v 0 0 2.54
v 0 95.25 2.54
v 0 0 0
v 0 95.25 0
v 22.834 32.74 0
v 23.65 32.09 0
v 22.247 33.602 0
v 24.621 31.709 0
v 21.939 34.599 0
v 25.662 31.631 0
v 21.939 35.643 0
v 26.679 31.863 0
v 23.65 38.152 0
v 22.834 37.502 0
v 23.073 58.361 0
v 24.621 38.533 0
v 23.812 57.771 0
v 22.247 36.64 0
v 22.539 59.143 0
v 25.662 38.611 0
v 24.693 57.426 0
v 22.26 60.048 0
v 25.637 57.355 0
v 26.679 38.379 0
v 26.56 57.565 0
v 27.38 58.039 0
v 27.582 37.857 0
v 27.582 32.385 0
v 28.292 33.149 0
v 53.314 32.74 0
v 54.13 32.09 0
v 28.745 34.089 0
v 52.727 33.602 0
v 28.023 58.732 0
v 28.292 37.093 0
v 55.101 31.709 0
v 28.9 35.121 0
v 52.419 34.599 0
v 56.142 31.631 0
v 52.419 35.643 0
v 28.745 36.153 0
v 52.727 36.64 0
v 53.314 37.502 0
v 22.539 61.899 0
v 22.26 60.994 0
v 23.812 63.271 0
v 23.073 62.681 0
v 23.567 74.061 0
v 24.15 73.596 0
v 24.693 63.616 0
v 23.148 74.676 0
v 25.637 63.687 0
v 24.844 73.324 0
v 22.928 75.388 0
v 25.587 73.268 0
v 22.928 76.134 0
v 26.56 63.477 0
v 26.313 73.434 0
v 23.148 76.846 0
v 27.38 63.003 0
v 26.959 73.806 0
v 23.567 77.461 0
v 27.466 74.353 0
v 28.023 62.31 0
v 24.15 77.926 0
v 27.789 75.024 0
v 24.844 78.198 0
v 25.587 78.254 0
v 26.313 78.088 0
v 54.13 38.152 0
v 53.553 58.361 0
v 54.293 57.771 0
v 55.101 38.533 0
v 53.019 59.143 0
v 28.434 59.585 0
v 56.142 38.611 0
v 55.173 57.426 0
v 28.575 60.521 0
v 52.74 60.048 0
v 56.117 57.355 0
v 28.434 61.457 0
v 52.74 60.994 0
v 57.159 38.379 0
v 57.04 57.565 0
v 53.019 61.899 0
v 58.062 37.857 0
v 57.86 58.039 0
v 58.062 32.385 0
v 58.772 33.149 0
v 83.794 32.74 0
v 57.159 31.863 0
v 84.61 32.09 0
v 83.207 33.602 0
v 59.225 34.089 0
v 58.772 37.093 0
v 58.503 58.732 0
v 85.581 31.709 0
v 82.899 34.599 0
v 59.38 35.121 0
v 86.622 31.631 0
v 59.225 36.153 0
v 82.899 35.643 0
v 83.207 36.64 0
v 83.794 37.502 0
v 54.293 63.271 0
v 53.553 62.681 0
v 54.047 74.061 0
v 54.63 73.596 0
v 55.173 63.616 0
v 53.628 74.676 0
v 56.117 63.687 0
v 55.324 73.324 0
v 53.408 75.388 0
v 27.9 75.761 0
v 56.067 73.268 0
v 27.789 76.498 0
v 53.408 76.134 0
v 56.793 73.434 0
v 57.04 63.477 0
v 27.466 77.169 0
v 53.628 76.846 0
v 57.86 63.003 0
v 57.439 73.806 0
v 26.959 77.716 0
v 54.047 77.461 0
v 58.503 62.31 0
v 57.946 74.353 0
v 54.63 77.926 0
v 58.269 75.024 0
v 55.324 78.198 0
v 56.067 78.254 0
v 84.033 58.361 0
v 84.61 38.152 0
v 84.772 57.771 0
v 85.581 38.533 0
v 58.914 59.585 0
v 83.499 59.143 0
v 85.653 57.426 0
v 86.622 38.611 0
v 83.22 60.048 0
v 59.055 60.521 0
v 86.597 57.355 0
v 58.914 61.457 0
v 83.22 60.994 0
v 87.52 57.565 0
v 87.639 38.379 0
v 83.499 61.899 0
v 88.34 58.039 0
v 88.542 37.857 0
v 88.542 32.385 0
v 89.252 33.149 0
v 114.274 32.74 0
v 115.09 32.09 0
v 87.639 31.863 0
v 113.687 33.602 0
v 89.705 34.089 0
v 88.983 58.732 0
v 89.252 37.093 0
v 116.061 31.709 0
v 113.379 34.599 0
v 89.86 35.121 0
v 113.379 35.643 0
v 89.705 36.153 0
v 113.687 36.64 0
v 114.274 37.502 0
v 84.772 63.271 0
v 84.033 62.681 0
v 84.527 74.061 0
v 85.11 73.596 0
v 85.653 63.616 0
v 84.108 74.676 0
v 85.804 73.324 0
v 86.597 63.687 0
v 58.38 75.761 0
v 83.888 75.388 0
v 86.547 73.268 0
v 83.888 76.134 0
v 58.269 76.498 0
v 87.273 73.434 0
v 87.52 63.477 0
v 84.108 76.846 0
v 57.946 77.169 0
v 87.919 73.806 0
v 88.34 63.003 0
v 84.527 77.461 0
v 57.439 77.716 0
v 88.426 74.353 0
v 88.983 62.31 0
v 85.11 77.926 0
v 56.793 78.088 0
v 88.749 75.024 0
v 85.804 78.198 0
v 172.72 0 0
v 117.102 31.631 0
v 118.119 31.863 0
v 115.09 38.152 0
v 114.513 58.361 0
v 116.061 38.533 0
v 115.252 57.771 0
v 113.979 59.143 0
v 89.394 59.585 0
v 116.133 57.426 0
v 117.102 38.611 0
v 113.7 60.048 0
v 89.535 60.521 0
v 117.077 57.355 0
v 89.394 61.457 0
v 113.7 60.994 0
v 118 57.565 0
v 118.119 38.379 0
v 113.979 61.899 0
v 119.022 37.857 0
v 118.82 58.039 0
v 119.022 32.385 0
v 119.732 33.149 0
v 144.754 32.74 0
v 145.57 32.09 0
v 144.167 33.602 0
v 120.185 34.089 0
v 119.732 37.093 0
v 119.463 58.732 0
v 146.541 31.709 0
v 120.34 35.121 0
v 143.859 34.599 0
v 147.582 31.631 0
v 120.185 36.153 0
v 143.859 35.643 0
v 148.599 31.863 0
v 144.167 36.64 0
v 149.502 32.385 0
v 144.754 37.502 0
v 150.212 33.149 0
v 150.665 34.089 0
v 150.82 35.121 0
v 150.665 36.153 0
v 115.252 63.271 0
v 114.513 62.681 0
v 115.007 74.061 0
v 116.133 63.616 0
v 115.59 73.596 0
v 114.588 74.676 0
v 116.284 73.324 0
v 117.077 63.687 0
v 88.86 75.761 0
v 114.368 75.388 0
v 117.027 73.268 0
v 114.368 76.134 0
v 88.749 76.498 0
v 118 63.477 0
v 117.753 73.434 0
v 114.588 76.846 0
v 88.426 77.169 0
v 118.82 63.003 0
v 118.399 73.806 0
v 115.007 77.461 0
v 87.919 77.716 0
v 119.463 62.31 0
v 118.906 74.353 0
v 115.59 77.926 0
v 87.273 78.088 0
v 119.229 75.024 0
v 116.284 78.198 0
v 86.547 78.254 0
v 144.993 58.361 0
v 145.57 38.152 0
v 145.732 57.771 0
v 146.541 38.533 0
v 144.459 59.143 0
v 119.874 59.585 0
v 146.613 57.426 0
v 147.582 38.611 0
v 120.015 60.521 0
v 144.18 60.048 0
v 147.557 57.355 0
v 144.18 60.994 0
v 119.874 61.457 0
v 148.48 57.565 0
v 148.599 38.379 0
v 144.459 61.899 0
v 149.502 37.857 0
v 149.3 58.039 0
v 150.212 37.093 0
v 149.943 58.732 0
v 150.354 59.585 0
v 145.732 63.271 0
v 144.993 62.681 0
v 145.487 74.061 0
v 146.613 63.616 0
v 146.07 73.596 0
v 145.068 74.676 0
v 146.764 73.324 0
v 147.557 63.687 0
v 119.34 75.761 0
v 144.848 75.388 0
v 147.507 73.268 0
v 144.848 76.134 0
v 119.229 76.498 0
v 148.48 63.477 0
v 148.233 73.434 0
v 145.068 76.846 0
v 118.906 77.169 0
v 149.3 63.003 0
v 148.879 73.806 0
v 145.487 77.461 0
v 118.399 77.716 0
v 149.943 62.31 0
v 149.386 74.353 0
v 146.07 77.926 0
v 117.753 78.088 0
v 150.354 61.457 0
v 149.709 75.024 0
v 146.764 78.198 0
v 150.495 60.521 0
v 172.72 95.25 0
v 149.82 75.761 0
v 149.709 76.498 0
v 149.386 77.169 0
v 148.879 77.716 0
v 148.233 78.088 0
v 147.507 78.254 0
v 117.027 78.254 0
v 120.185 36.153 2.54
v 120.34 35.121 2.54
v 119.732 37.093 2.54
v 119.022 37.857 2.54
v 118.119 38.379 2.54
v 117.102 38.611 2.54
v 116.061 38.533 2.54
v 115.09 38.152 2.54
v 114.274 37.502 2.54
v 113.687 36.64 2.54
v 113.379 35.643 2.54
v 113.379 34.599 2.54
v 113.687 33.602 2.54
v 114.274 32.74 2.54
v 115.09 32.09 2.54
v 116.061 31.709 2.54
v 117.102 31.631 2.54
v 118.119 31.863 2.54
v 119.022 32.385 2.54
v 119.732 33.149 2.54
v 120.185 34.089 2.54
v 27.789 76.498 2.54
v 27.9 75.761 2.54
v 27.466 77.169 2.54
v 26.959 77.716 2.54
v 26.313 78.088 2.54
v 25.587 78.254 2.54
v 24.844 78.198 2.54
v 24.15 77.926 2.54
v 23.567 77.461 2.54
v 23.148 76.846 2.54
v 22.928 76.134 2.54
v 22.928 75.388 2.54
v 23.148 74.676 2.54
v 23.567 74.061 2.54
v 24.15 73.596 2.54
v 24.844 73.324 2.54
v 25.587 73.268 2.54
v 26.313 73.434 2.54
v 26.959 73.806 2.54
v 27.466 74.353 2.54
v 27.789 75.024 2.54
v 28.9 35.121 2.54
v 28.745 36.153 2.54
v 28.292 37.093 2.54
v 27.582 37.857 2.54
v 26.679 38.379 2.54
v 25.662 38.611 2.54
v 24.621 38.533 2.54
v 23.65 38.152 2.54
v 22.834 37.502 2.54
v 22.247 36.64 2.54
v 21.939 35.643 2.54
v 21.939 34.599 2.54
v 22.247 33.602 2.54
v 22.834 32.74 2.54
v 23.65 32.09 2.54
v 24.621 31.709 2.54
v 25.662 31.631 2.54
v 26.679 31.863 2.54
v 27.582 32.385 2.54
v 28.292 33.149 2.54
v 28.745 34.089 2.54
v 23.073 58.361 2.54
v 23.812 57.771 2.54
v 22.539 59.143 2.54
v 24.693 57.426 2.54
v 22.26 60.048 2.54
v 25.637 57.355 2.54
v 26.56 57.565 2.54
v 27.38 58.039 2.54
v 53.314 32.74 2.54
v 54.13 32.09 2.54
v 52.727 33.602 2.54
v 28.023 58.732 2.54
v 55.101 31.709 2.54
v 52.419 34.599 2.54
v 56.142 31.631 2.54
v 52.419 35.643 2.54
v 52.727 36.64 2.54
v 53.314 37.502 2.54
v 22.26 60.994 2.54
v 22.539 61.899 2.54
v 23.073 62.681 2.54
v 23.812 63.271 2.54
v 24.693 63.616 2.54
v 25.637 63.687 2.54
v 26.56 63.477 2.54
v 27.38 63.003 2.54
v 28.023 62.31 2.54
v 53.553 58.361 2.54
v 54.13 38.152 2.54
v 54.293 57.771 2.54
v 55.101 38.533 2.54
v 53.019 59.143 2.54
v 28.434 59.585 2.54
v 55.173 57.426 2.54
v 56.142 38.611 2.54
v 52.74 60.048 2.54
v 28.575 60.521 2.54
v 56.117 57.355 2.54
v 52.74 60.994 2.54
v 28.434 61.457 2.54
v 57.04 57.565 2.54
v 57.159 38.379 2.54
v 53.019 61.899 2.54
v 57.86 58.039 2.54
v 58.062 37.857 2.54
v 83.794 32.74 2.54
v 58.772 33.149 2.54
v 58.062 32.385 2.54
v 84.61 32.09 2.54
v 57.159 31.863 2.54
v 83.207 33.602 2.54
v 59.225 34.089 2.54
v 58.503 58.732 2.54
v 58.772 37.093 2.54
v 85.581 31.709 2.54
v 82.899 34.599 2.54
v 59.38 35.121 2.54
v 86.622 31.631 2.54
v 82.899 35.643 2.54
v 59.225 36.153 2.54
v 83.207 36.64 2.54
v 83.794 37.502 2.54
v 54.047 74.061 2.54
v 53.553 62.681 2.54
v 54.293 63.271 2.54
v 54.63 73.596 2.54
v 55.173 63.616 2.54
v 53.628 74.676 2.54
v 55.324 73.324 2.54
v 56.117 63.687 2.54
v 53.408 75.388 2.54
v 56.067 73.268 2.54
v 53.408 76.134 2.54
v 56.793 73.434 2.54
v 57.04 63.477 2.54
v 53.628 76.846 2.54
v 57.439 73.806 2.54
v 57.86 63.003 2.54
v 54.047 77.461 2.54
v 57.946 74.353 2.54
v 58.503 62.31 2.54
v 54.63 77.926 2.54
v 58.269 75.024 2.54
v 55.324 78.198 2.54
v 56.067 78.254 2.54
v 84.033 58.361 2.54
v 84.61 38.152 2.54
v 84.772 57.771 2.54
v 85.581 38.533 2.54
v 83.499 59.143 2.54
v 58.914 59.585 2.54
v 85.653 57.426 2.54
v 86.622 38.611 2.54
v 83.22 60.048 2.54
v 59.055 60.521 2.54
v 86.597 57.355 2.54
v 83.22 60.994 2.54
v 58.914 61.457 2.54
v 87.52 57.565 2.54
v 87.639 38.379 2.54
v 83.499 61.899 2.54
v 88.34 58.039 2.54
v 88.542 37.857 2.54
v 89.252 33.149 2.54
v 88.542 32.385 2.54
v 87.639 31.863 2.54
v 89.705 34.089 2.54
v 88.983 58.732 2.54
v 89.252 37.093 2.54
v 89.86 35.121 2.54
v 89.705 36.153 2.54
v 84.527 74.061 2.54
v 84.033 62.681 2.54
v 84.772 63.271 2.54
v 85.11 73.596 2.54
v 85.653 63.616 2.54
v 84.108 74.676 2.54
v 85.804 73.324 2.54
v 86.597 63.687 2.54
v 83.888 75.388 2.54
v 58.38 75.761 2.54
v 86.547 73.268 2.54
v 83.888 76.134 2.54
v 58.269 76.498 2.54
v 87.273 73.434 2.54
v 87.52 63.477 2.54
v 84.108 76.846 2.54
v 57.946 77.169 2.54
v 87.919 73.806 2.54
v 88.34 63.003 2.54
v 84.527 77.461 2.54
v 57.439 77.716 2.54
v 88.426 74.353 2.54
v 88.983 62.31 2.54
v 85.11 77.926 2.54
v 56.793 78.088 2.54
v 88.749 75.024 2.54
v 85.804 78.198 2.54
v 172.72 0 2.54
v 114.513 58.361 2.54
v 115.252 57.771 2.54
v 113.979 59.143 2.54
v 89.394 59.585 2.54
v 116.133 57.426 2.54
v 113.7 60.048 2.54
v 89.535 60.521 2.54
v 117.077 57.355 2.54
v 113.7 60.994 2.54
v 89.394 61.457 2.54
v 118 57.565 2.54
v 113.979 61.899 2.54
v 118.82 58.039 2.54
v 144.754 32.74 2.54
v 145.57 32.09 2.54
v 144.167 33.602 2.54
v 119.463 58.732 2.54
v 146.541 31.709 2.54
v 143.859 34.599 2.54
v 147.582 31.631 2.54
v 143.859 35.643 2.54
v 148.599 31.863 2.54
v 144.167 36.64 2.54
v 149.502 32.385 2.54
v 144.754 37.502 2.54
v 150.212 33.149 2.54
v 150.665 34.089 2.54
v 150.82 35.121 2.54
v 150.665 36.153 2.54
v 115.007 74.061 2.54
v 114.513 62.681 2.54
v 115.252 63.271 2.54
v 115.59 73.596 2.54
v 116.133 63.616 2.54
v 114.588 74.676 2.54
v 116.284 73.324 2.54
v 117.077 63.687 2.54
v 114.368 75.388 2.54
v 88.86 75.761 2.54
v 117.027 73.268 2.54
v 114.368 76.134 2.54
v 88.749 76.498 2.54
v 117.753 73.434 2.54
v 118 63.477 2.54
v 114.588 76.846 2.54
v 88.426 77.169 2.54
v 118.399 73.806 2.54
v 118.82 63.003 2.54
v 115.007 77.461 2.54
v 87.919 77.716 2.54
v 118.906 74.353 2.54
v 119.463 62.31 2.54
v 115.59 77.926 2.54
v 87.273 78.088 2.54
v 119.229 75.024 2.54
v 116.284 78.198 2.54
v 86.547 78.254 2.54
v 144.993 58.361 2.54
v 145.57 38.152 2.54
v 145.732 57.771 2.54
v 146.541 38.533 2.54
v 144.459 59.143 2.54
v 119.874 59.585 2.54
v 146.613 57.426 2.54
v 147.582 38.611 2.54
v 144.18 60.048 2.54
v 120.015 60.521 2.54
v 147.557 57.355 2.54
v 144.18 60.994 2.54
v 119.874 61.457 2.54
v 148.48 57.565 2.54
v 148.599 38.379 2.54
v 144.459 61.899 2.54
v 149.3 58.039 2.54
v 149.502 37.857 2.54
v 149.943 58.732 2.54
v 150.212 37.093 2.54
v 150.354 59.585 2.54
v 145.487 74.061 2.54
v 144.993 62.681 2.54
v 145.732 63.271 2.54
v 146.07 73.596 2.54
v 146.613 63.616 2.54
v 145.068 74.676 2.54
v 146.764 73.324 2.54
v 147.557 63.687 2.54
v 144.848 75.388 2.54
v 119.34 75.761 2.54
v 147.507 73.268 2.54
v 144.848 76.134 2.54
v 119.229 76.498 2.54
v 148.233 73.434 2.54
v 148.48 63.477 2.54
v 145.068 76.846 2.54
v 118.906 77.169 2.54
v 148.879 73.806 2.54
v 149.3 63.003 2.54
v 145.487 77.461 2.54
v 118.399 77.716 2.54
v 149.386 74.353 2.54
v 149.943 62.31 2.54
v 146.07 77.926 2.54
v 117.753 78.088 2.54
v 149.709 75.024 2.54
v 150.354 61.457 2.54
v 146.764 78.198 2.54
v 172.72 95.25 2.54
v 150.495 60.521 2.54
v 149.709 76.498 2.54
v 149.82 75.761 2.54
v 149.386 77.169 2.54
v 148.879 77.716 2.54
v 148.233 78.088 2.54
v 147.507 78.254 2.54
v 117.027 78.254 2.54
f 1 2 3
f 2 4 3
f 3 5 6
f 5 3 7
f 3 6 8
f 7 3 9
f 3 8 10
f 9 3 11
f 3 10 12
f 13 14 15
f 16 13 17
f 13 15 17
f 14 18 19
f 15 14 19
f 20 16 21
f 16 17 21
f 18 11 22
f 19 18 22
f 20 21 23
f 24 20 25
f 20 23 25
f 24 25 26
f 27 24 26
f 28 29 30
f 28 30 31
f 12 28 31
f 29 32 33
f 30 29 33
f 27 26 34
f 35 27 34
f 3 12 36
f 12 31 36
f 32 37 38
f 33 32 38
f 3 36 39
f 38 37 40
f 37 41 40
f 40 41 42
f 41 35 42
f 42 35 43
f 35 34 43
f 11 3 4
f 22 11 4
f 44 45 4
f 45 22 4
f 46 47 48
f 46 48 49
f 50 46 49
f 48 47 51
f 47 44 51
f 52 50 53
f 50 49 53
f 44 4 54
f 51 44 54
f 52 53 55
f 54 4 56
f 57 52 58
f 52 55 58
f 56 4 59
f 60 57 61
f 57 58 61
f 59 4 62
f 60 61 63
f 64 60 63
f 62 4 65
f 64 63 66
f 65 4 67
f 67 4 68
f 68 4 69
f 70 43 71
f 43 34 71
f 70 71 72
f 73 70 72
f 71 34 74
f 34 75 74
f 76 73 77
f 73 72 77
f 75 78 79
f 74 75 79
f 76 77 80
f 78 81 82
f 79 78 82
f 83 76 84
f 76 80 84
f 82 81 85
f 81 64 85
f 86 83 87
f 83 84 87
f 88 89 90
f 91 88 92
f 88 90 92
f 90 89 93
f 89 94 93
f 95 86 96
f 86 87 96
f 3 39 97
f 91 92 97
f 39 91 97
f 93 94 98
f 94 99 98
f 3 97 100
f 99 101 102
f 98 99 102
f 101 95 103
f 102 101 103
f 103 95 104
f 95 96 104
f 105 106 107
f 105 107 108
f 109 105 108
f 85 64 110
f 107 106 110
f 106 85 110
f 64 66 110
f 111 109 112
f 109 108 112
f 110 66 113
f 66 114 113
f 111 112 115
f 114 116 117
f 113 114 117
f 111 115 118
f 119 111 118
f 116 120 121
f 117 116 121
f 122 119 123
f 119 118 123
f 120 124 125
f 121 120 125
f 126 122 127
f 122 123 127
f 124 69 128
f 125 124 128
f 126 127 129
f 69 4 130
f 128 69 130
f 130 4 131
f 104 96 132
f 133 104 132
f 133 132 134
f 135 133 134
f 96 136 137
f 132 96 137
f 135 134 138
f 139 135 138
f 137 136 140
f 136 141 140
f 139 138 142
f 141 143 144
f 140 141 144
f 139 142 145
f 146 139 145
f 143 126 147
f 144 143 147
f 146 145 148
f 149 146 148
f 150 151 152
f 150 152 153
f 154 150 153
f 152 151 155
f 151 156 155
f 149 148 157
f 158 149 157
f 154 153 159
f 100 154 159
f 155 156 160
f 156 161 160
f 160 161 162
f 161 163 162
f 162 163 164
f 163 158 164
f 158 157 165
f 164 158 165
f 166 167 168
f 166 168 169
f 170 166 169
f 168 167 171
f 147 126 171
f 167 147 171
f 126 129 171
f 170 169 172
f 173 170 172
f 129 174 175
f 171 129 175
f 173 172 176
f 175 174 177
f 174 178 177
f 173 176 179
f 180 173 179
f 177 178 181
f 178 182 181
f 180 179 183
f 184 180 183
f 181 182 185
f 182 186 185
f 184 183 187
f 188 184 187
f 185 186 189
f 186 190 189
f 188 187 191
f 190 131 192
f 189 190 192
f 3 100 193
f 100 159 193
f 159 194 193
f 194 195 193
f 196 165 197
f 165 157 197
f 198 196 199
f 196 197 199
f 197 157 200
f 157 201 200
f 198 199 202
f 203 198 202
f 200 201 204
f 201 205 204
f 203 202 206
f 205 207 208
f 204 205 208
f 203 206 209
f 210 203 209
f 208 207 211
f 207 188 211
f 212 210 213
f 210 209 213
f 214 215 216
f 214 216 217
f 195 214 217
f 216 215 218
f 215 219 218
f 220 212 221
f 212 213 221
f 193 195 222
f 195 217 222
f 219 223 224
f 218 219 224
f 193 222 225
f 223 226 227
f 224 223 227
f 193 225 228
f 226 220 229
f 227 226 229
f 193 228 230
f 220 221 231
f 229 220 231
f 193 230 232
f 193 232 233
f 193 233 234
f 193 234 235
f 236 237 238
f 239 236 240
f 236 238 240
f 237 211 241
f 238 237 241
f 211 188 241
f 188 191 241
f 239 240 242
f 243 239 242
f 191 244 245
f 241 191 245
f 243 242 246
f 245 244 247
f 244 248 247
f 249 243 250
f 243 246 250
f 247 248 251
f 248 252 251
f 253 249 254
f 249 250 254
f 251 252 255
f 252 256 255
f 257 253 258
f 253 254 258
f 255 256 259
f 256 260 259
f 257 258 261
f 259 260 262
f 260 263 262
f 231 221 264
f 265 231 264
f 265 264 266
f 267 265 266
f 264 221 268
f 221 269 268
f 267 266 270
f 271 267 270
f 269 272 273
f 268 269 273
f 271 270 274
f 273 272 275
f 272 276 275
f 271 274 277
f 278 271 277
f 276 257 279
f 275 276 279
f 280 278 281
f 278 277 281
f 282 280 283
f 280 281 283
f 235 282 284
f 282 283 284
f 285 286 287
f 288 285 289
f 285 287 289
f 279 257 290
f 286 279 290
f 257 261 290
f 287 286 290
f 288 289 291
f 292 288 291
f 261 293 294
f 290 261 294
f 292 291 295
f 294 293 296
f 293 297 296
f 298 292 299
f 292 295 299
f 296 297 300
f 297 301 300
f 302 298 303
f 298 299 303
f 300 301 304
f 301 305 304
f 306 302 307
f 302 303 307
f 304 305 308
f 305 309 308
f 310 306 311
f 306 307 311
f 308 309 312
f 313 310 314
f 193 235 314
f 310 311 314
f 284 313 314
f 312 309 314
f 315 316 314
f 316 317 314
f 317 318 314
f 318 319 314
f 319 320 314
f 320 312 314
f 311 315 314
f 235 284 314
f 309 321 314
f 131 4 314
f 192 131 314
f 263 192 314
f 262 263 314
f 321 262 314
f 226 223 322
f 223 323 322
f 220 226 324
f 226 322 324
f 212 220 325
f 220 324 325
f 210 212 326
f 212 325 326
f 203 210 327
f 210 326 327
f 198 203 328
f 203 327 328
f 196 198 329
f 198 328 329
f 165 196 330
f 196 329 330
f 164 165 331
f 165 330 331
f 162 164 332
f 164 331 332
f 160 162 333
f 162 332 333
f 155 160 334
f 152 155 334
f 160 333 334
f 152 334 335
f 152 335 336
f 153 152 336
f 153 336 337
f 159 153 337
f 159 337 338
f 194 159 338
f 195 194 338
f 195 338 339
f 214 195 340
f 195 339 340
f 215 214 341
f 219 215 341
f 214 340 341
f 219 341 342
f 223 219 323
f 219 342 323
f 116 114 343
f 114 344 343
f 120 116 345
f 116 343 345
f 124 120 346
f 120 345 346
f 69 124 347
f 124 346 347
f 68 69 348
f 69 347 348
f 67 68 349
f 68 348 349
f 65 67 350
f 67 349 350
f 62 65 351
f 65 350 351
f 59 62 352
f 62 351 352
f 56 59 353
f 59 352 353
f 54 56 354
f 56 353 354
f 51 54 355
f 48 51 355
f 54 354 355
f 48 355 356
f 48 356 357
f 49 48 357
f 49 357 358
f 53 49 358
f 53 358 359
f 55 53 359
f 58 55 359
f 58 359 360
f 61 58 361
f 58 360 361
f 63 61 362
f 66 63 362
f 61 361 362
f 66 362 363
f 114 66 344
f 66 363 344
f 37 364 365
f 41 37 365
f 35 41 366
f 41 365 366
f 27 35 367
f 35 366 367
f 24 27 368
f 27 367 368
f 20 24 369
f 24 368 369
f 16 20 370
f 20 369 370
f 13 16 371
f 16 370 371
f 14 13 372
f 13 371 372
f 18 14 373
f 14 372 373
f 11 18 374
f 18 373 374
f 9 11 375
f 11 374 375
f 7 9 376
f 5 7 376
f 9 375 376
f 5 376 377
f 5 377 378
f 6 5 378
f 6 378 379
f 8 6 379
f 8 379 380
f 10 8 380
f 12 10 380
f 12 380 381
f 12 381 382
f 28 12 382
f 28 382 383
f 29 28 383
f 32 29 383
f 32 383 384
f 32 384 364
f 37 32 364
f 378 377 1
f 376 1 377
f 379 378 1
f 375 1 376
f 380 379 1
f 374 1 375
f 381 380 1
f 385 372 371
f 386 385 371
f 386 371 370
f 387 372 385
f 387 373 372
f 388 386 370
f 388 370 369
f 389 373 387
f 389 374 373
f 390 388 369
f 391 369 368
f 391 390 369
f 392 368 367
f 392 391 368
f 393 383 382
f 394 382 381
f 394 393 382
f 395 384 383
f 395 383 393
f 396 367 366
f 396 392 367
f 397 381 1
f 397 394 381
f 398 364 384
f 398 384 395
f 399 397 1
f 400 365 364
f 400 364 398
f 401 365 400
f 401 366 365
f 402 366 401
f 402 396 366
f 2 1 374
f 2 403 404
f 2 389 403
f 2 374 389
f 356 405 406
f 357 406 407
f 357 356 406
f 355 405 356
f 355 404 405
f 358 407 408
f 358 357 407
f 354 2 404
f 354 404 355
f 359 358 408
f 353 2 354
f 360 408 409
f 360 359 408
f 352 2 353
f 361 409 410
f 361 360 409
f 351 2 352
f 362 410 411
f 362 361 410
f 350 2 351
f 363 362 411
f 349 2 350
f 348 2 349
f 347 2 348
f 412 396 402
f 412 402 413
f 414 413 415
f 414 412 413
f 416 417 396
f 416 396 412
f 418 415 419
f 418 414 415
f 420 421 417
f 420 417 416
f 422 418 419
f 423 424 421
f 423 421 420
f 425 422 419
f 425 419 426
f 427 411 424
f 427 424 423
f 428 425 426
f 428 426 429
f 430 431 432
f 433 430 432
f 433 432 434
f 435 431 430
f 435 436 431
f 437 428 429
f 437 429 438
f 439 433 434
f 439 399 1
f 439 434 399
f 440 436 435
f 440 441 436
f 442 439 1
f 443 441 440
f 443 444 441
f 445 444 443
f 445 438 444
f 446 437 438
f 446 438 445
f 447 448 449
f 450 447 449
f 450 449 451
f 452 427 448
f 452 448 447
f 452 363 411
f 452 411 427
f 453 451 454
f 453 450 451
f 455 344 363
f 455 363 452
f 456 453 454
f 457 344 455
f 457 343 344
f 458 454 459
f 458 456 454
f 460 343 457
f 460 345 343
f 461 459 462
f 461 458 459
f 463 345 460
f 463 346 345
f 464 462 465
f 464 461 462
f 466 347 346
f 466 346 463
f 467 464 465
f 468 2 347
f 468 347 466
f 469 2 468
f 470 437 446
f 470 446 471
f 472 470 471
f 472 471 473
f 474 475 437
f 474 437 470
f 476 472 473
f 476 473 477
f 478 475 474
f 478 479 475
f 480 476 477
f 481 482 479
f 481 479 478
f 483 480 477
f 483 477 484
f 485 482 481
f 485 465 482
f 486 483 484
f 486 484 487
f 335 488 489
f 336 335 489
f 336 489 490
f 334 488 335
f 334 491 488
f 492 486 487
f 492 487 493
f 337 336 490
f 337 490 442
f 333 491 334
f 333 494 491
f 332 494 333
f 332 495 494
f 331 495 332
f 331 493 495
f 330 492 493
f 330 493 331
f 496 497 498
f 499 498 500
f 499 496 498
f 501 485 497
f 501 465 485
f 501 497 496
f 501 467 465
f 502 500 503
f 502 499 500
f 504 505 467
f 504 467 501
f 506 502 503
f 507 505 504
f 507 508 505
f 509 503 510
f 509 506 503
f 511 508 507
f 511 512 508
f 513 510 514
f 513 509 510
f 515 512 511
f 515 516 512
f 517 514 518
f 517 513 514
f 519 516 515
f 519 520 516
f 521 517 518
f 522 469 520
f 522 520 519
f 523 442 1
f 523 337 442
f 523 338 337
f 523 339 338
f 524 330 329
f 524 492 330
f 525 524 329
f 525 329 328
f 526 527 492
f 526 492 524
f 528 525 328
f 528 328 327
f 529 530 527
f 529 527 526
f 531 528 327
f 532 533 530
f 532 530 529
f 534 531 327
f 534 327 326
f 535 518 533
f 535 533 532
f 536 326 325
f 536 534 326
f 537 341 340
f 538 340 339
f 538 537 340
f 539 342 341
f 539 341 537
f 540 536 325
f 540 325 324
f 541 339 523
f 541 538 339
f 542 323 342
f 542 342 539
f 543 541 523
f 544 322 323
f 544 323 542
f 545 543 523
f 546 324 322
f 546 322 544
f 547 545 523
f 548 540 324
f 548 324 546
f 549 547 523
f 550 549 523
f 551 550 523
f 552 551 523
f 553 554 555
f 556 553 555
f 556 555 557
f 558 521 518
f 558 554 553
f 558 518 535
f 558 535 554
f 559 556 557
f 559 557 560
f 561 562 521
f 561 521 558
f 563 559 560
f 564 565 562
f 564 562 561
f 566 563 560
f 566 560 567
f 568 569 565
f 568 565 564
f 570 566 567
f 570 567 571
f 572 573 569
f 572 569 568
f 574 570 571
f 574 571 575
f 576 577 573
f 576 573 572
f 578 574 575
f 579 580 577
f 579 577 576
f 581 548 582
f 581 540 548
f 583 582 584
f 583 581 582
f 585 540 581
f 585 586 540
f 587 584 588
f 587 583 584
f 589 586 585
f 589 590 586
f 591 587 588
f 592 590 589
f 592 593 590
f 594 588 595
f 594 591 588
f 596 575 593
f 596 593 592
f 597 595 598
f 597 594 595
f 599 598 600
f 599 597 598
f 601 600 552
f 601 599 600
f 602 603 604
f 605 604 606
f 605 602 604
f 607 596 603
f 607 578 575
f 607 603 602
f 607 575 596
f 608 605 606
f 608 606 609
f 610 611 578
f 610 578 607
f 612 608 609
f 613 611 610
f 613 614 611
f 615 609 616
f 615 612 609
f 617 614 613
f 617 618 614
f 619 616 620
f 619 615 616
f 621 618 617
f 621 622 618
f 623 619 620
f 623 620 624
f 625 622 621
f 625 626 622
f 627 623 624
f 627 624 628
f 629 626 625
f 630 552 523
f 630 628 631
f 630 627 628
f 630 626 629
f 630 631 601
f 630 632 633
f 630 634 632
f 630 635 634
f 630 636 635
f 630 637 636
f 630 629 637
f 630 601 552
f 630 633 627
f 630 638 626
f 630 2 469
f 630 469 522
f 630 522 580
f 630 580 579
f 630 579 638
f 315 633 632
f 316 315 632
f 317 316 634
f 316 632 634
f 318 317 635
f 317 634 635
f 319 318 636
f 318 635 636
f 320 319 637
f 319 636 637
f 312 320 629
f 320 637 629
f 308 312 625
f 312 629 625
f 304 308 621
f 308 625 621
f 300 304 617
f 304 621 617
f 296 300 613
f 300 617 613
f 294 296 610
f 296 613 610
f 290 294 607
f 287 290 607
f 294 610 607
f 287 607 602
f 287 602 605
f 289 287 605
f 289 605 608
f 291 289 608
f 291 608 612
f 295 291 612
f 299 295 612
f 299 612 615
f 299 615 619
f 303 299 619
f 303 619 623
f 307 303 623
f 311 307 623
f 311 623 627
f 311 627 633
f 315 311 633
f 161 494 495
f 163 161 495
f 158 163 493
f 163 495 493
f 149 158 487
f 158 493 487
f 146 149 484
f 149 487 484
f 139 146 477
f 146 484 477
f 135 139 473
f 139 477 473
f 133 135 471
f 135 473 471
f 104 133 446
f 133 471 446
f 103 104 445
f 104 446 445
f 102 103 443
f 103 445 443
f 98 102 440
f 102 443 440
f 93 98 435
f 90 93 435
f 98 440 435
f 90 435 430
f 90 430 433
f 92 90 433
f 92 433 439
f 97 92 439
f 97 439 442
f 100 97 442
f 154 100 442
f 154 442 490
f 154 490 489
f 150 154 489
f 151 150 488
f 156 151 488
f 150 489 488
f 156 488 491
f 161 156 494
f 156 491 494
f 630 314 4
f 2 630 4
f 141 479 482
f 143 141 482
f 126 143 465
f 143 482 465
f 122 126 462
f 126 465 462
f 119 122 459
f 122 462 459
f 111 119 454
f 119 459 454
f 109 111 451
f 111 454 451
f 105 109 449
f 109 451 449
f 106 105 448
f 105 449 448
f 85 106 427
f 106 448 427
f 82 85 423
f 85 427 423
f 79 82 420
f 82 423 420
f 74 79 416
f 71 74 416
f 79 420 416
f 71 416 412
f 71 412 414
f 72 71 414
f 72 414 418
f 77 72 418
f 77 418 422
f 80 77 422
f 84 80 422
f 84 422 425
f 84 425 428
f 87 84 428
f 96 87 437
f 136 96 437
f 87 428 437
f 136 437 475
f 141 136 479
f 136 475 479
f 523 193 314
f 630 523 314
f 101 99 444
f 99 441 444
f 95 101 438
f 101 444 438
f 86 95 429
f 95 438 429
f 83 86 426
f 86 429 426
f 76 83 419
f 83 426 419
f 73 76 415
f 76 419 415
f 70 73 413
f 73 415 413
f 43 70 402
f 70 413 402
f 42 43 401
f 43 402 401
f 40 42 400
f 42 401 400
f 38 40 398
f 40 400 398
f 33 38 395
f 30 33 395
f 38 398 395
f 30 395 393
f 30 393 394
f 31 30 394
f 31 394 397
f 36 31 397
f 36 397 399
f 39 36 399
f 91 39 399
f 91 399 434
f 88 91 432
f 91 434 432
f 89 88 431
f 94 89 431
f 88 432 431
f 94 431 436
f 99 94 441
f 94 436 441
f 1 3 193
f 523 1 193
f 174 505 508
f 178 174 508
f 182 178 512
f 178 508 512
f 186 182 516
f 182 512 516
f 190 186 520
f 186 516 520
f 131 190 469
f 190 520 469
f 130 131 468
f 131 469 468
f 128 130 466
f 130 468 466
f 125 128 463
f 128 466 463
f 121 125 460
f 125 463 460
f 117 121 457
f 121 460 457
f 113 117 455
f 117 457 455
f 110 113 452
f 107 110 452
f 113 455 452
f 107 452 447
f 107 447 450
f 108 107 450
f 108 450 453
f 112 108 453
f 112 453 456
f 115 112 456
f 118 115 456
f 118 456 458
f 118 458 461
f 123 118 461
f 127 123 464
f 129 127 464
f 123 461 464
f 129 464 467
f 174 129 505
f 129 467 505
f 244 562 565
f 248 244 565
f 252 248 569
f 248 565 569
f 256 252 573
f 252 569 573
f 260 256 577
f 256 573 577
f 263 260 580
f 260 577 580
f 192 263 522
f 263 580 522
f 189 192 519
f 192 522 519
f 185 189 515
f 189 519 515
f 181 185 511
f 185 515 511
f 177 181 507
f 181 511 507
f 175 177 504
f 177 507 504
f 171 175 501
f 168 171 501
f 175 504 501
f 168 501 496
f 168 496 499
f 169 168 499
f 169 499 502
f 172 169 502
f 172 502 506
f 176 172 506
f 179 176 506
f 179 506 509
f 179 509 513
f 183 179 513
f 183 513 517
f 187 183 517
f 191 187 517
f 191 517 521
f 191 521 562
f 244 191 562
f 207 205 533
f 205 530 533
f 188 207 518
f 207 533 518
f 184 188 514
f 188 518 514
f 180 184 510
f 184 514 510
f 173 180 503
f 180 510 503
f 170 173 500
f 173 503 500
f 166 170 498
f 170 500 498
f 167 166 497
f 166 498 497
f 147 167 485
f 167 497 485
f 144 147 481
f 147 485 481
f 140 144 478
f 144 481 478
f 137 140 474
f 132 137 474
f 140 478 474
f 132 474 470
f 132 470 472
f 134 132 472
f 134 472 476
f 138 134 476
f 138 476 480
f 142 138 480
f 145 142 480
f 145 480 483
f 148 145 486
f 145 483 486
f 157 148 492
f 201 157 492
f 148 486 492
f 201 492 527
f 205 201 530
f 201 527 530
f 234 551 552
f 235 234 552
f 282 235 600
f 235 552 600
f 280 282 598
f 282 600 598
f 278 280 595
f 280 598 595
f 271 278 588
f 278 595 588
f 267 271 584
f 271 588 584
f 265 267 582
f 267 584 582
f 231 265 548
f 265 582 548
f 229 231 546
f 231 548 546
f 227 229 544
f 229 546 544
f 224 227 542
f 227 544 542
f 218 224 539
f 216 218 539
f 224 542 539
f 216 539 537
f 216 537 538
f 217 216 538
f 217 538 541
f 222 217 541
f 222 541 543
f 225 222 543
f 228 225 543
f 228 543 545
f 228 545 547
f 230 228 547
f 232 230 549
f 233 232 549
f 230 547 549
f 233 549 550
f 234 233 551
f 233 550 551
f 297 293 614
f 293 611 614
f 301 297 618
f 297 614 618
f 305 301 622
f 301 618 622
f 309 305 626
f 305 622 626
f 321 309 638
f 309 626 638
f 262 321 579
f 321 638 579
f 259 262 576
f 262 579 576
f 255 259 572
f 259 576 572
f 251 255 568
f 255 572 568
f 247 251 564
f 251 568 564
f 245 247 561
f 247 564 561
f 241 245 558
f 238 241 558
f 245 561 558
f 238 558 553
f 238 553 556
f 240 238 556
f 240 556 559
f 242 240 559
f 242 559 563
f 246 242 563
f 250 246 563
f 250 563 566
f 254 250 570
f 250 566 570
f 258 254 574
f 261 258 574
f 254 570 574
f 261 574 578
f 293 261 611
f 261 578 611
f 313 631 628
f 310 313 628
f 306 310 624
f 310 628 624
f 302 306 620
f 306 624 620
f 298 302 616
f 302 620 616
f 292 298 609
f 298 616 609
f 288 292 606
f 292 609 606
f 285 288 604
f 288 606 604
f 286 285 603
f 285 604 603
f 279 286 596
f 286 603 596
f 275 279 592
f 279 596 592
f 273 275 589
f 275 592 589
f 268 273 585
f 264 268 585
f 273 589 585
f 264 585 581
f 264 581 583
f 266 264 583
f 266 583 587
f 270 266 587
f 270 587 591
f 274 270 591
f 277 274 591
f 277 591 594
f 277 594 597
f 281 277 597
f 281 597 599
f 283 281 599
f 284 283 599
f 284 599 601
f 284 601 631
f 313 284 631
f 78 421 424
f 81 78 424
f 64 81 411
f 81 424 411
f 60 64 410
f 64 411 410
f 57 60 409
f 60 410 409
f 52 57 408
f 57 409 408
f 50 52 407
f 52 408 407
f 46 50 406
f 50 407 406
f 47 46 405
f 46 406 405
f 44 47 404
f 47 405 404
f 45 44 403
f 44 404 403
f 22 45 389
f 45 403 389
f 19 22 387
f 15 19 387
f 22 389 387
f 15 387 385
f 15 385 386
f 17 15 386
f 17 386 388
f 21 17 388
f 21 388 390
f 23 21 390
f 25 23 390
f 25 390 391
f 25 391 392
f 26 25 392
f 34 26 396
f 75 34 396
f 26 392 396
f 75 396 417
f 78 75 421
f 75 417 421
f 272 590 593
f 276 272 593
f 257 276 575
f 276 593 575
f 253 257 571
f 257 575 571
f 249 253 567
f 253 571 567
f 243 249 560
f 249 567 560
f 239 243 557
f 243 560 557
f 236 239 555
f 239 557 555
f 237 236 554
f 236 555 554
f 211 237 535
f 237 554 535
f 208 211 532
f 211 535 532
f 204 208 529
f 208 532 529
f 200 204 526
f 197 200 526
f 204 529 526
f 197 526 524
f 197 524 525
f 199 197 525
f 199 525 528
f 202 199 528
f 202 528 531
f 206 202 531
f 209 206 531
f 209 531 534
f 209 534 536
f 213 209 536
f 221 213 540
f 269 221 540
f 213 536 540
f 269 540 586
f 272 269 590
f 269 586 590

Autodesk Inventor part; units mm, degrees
ref_plane "YZ Plane" through (0, 0, 0) normal (1, 0, 0) x (0, 1, 0)
ref_plane "XZ Plane" through (0, 0, 0) normal (0, 1, 0) x (-1, 0, 0)
ref_plane "XY Plane" through (0, 0, 0) normal (0, 0, 1) x (1, 0, 0)
sketch "Sketch1" plane through (0, 0, 0) normal (0, 0, 1) x (1, 0, 0)
  line L0 (0, 0) -> (172.72, 0)
  line L1 (172.72, 0) -> (172.72, 95.25)
  line L2 (172.72, 95.25) -> (0, 95.25)
  line L3 (0, 95.25) -> (0, 0)
  dimension "d53" = 172.72
  dimension "d57" = 95.25
extrude "Extrusion1" add sketch "Sketch1" along normal blind 2.54
sketch "Sketch2" plane through (0, 0, 2.54) normal (0, 0, 1) x (1, 0, 0)
  circle A0 centre (25.4, 35.121) radius 3.5
  circle A1 centre (25.4, 60.521) radius 3.175
  line L0 (0, 95.25) -> (0, 0) projected
  circle A2 centre (55.88, 60.521) radius 3.175
  circle A3 centre (86.36, 60.521) radius 3.175
  circle A4 centre (116.84, 60.521) radius 3.175
  circle A5 centre (147.32, 60.521) radius 3.175
  circle A6 centre (25.4, 75.761) radius 2.5
  circle A7 centre (55.88, 75.761) radius 2.5
  circle A8 centre (86.36, 75.761) radius 2.5
  circle A9 centre (116.84, 75.761) radius 2.5
  circle A10 centre (147.32, 75.761) radius 2.5
  circle A11 centre (55.88, 35.121) radius 3.5
  circle A12 centre (86.36, 35.121) radius 3.5
  circle A13 centre (116.84, 35.121) radius 3.5
  circle A14 centre (147.32, 35.121) radius 3.5
  line L1 (172.72, 0) -> (172.72, 95.25) projected
  dimension "d4" = 7
  dimension "d5" = 6.35
  dimension "d8" = 25.4
  dimension "d9" = 6.35
  dimension "d10" = 6.35
  dimension "d11" = 6.35
  dimension "d12" = 6.35
  dimension "d18" = 0
  dimension "d19" = 0
  dimension "d20" = 0
  dimension "d21" = 0
  dimension "d22" = 5
  dimension "d23" = 15.24
  dimension "d24" = 0
  dimension "d25" = 5
  dimension "d26" = 5
  dimension "d27" = 5
  dimension "d28" = 5
  dimension "d29" = 15.24
  dimension "d34" = 15.24
  dimension "d35" = 15.24
  dimension "d36" = 15.24
  dimension "d37" = 7
  dimension "d38" = 7
  dimension "d39" = 7
  dimension "d40" = 7
  dimension "d41" = 30.48
  dimension "d42" = 25.4
  dimension "d43" = 30.48
  dimension "d44" = 25.4
  dimension "d45" = 30.48
  dimension "d46" = 25.4
  dimension "d47" = 30.48
  dimension "d48" = 25.4
  dimension "d49" = 30.48
  dimension "d50" = 30.48
  dimension "d51" = 30.48
  dimension "d52" = 30.48
  dimension "d58" = 30.48
  dimension "d59" = 30.48
  dimension "d60" = 30.48
  dimension "d61" = 30.48
  dimension "d62" = 0
  dimension "d63" = 25.4
extrude "Extrusion2" cut sketch "Sketch2" against normal blind 2.54
properties part number "front"
